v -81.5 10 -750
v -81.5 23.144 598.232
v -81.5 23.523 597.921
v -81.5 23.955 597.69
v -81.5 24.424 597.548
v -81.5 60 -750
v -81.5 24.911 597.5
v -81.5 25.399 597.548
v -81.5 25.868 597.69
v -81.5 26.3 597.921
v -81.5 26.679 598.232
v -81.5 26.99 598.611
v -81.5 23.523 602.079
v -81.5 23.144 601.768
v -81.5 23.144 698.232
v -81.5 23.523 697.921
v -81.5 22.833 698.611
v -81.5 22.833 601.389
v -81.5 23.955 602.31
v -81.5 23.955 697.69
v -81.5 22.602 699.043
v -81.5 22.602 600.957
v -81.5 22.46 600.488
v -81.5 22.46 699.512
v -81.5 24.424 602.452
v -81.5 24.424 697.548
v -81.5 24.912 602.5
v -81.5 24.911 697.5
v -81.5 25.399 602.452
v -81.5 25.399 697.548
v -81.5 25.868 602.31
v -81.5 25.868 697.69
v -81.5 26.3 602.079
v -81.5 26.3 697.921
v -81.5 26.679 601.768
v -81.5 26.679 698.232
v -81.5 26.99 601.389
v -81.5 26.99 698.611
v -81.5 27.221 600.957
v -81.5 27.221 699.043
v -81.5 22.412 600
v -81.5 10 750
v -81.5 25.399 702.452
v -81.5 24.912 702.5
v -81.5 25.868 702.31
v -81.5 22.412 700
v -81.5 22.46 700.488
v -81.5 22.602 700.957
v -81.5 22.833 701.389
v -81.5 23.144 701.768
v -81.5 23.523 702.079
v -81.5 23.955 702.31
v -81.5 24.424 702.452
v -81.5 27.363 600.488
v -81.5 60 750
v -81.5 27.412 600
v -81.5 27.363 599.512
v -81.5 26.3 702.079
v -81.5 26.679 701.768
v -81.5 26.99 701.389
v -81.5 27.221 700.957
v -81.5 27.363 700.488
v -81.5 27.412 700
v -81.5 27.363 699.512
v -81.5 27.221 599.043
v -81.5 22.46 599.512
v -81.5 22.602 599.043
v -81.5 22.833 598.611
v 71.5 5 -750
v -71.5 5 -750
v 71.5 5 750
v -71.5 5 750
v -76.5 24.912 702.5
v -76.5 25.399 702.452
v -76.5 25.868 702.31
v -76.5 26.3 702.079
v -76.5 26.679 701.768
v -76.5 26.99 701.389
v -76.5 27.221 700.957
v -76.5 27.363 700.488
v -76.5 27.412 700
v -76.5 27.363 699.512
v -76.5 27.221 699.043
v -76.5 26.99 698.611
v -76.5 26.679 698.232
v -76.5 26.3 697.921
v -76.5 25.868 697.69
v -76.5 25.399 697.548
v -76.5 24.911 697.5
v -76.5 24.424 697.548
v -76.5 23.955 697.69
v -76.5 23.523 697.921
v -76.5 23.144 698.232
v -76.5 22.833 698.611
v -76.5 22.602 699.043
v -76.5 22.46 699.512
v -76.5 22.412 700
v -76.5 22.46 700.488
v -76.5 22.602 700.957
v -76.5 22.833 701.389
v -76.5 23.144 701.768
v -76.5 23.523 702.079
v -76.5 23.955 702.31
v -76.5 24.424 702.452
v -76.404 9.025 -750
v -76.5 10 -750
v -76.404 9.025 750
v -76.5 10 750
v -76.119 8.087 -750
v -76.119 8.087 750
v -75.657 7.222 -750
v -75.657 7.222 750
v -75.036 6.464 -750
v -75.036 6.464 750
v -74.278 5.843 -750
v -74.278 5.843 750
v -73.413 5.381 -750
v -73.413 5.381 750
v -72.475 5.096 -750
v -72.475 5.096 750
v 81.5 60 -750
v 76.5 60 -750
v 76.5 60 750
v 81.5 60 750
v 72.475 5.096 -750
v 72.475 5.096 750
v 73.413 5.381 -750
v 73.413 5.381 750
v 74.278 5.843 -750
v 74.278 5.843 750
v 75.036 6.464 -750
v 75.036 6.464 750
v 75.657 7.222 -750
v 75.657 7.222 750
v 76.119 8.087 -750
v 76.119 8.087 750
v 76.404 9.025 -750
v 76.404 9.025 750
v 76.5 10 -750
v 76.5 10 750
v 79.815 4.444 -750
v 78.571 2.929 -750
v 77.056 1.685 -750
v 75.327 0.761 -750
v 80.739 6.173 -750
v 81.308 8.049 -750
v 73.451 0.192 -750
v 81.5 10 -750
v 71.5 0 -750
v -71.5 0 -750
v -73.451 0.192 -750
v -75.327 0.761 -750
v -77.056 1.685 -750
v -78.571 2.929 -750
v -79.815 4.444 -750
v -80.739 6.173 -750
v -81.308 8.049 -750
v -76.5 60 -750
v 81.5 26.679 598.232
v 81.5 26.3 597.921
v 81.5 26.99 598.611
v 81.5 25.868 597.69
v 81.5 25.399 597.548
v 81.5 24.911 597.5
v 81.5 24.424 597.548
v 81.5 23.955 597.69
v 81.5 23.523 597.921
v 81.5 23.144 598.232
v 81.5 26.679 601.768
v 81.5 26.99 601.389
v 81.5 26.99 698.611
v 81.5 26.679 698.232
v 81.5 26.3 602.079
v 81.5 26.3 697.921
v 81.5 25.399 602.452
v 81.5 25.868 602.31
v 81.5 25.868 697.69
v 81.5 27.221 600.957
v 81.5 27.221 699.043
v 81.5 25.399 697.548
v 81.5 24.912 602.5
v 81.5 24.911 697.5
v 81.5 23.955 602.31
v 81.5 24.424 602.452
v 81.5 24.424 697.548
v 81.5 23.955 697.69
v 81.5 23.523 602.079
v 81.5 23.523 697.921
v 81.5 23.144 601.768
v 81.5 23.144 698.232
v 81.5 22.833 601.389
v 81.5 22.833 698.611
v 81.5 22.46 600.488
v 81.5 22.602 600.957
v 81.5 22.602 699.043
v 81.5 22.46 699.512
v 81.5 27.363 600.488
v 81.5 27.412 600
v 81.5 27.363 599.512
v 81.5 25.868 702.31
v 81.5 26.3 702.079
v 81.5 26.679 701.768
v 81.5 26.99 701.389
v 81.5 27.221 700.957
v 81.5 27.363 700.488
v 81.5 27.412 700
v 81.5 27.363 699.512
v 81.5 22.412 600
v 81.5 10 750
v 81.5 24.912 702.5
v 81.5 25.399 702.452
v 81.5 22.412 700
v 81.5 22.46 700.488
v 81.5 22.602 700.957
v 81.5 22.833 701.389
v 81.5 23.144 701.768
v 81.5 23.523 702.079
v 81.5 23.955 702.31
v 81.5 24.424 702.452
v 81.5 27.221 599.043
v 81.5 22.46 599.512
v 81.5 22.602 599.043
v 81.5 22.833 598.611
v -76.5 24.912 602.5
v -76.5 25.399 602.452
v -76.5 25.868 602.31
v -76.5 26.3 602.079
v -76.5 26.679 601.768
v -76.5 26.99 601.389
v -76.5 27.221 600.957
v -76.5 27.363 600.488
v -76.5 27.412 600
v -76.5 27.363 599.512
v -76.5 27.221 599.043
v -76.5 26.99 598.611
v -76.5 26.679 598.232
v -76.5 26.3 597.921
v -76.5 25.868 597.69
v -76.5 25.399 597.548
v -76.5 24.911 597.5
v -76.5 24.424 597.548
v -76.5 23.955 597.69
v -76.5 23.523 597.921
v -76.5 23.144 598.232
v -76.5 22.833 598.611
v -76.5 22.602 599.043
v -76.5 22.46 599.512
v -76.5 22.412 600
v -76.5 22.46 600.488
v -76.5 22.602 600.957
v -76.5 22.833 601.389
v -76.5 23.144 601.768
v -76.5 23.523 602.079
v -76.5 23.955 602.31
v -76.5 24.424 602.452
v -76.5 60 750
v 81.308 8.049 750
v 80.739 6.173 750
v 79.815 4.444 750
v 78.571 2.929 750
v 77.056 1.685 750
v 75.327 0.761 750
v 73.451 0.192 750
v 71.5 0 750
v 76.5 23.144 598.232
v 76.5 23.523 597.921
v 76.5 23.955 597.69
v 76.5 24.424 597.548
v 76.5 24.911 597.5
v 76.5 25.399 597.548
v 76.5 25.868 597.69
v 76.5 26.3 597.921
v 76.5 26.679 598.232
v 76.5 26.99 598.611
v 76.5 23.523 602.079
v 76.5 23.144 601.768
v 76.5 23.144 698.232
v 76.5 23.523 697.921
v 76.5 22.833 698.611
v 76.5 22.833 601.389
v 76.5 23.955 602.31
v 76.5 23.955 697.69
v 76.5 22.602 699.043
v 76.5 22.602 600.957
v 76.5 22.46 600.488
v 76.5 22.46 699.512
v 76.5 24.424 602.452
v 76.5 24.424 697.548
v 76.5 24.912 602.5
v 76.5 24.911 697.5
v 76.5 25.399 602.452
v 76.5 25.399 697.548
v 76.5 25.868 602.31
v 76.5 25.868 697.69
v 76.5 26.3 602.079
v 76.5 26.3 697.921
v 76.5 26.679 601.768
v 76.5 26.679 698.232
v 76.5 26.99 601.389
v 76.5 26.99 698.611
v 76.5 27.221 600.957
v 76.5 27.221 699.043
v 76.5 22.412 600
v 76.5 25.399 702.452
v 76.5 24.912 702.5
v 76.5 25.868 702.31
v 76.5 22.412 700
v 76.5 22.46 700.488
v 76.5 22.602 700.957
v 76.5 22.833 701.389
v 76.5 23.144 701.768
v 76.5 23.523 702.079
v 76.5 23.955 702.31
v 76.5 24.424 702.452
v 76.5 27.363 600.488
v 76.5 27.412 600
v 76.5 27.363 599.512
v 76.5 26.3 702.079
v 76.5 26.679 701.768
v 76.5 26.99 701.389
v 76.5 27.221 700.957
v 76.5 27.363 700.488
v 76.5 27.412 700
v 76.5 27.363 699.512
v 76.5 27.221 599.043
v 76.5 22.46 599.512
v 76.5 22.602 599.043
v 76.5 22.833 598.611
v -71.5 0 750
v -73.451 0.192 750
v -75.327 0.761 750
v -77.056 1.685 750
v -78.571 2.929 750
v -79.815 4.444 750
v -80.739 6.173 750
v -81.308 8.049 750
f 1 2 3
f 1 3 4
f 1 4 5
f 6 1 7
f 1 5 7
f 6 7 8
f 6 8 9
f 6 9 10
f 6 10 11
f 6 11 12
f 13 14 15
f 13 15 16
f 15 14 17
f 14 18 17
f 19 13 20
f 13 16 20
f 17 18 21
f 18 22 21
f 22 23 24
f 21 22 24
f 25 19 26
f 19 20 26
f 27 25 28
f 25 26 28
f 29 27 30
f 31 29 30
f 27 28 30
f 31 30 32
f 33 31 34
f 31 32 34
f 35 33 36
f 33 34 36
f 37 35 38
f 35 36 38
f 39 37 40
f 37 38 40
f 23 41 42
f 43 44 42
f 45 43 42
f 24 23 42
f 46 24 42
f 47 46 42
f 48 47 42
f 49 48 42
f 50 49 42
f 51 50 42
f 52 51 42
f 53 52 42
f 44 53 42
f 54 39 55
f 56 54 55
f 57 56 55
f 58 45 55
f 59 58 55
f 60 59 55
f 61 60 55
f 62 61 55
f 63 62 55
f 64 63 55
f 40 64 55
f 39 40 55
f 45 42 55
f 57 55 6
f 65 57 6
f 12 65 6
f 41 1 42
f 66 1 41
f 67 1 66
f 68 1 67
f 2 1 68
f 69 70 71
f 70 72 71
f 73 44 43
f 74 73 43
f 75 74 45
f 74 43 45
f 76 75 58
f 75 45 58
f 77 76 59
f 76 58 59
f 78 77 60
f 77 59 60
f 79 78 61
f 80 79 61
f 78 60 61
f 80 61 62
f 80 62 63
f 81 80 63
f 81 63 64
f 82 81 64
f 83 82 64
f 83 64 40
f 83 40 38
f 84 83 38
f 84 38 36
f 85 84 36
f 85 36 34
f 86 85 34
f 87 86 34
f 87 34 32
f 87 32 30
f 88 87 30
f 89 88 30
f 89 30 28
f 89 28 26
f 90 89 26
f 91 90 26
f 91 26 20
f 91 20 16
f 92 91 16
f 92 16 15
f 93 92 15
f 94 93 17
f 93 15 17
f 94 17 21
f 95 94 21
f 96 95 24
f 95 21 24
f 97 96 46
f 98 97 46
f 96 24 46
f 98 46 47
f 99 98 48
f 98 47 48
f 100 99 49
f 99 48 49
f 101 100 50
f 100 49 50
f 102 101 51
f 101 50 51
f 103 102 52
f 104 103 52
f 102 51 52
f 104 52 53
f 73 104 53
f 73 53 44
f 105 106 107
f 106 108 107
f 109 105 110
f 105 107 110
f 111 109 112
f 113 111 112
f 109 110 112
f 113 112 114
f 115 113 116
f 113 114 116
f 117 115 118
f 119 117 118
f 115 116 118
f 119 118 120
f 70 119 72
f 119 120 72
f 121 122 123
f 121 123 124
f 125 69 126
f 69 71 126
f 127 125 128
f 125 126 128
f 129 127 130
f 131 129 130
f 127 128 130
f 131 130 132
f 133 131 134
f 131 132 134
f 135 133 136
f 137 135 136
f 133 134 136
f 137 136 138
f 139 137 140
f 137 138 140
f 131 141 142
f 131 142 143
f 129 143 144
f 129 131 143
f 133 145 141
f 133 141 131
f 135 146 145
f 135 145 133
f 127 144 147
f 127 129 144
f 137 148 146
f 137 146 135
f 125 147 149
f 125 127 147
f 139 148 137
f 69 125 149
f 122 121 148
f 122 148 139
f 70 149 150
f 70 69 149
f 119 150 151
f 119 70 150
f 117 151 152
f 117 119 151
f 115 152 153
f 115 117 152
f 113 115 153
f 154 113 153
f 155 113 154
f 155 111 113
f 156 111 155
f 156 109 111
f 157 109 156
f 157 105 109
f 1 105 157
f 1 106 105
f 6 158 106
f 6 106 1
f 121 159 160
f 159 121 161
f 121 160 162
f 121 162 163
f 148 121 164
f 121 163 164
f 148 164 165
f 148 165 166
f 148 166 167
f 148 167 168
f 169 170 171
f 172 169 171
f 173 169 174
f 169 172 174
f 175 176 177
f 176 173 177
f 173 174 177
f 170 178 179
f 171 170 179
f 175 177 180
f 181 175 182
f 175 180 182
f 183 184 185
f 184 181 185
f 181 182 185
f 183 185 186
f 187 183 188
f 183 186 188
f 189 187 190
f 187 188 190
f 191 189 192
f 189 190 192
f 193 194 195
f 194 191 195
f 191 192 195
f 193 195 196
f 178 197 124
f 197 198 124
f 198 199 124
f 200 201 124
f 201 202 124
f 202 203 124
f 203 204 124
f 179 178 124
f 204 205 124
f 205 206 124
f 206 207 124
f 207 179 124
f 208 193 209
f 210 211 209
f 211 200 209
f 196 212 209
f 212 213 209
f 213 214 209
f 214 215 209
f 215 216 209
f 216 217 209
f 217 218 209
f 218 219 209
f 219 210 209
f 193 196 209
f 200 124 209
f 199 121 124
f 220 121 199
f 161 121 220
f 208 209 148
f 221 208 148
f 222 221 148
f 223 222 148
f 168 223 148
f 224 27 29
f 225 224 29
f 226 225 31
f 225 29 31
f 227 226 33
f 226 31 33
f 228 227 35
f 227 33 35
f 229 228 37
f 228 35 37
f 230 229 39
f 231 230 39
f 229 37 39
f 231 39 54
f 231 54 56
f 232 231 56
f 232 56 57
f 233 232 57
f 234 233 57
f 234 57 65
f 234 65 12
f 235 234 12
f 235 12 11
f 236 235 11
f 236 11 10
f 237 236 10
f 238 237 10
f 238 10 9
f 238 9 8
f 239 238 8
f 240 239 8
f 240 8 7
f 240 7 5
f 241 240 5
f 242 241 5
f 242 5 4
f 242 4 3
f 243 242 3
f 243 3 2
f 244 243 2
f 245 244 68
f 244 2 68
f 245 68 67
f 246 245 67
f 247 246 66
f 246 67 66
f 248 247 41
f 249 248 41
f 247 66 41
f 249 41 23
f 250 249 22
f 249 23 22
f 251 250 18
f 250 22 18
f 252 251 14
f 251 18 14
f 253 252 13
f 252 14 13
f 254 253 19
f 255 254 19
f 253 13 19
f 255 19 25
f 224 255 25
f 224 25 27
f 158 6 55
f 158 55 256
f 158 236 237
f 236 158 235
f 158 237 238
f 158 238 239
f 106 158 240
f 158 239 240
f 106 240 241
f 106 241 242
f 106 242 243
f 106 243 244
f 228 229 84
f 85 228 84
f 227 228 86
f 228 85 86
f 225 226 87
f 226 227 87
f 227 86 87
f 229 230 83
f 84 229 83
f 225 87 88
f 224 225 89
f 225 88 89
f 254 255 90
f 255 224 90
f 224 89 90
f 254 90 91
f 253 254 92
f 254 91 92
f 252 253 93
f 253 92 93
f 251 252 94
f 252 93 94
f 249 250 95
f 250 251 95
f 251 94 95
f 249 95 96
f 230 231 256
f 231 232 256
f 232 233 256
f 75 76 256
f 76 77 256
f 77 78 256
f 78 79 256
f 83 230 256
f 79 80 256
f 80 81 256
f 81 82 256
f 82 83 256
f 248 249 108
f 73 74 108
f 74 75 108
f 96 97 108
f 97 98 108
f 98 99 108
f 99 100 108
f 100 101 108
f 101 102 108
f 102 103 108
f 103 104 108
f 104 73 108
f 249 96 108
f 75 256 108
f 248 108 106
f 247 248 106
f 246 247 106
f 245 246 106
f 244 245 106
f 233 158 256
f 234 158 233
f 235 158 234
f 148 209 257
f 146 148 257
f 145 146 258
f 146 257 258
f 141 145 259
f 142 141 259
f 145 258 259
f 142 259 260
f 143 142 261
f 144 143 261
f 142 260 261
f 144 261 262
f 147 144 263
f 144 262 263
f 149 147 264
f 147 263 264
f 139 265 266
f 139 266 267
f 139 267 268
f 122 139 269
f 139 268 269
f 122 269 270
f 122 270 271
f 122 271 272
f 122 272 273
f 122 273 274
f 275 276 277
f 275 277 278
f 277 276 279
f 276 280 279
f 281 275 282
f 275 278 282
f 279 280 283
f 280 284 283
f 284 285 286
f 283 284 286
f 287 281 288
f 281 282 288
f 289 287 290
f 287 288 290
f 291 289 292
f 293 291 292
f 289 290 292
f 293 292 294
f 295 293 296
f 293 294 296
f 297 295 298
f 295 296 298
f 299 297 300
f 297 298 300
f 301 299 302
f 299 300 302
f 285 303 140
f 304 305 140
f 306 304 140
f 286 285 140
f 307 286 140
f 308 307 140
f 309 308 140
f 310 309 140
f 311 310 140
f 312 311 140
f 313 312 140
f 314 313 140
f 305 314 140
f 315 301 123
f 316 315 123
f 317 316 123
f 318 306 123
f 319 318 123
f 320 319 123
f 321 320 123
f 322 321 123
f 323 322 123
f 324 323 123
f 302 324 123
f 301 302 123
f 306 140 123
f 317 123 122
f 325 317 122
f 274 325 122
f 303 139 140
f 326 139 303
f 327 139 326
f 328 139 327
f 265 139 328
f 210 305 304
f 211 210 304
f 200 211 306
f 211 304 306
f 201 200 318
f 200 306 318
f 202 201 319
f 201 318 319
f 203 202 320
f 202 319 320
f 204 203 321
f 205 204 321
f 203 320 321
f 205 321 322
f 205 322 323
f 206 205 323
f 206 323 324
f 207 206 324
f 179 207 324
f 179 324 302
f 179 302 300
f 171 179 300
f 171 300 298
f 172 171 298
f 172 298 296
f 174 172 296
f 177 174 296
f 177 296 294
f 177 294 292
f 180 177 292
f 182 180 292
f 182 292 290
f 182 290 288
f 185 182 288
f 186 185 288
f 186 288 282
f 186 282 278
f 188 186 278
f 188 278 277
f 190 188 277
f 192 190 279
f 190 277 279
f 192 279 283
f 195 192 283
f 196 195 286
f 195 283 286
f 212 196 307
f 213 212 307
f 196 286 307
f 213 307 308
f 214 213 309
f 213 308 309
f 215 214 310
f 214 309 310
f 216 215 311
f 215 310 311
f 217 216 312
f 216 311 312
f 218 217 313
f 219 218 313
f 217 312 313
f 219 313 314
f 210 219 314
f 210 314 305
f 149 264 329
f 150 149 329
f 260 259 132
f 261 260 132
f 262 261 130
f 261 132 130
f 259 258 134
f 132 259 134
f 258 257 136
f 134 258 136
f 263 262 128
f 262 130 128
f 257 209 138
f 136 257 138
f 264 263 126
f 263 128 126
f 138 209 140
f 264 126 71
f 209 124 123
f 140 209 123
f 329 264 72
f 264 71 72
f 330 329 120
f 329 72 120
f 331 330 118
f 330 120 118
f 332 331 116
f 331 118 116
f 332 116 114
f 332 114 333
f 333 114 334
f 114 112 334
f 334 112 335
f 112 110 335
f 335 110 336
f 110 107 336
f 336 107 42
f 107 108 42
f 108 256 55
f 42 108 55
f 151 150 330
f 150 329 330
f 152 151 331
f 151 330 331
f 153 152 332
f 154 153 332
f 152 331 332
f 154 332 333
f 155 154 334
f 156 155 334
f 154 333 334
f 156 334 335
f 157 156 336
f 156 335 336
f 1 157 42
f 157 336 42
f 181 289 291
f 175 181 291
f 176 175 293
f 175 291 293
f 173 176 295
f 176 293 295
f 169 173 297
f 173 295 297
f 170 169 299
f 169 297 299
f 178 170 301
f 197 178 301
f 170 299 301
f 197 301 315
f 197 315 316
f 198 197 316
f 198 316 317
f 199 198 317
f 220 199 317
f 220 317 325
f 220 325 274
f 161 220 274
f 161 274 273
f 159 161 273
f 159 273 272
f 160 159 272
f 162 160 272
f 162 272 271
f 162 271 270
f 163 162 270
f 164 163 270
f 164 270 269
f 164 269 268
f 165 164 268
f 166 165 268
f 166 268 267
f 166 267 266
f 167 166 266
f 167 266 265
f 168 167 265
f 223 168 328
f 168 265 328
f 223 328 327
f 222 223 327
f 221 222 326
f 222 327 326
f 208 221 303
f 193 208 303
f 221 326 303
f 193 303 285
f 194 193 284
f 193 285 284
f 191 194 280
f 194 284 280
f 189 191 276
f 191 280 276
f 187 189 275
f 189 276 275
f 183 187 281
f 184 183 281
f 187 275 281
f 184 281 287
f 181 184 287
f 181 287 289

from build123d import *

# Parameters (mm, degrees)
EXTRUDE_1_DEPTH          = 750
CUT_EXTRUDE_1_DEPTH      = 770.849985387
CUT_EXTRUDE_1_DEPTH_BACK = 770.849985387
SKETCH_2_R               = 2
HOLE_WIZARD_M61_D        = 5


with BuildPart() as part:
    # Эскиз1 → Бобышка-Вытянуть1 (new, symmetric)
    with BuildSketch(Plane.XY):
        with BuildLine():
            Line((71.5, 0), (-71.5, 0))
            ThreePointArc((-71.5, 0), (-78.571067812, 2.928932188), (-81.5, 10))
            Line((-81.5, 10), (-81.5, 60))
            Line((-81.5, 60), (-76.5, 60))
            Line((-76.5, 60), (-76.5, 10))
            ThreePointArc((-76.5, 10), (-75.035533906, 6.464466094), (-71.5, 5))
            Line((-71.5, 5), (71.5, 5))
            ThreePointArc((71.5, 5), (75.035533906, 6.464466094), (76.5, 10))
            Line((76.5, 10), (76.5, 60))
            Line((76.5, 60), (81.5, 60))
            Line((81.5, 60), (81.5, 10))
            ThreePointArc((81.5, 10), (78.571067812, 2.928932188), (71.5, 0))
        make_face()
    extrude(amount=EXTRUDE_1_DEPTH, both=True)

    # Эскиз2 → Вырез-Вытянуть1 (cut, two sides: drawn at the far end of the back side and taken through both)
    with BuildSketch(Plane(origin=(81.5, 0, 0), x_dir=(0, 0, -1), z_dir=(1, 0, 0)).offset(-CUT_EXTRUDE_1_DEPTH_BACK)):
        with Locations((-600, 24.9115)):
            Circle(SKETCH_2_R)
        with Locations((-700, 24.9115)):
            Circle(SKETCH_2_R)
    extrude(amount=CUT_EXTRUDE_1_DEPTH + CUT_EXTRUDE_1_DEPTH_BACK, mode=Mode.SUBTRACT)

    # Отверстие обработанное метчиком M61 (through all)
    with Locations(Plane(origin=(81.5, 0, 0), x_dir=(0, 0, -1), z_dir=(1, 0, 0))):
        with Locations((-600, 24.9115), (-700, 24.9115)):
            Hole(HOLE_WIZARD_M61_D / 2)


solid = part.part
